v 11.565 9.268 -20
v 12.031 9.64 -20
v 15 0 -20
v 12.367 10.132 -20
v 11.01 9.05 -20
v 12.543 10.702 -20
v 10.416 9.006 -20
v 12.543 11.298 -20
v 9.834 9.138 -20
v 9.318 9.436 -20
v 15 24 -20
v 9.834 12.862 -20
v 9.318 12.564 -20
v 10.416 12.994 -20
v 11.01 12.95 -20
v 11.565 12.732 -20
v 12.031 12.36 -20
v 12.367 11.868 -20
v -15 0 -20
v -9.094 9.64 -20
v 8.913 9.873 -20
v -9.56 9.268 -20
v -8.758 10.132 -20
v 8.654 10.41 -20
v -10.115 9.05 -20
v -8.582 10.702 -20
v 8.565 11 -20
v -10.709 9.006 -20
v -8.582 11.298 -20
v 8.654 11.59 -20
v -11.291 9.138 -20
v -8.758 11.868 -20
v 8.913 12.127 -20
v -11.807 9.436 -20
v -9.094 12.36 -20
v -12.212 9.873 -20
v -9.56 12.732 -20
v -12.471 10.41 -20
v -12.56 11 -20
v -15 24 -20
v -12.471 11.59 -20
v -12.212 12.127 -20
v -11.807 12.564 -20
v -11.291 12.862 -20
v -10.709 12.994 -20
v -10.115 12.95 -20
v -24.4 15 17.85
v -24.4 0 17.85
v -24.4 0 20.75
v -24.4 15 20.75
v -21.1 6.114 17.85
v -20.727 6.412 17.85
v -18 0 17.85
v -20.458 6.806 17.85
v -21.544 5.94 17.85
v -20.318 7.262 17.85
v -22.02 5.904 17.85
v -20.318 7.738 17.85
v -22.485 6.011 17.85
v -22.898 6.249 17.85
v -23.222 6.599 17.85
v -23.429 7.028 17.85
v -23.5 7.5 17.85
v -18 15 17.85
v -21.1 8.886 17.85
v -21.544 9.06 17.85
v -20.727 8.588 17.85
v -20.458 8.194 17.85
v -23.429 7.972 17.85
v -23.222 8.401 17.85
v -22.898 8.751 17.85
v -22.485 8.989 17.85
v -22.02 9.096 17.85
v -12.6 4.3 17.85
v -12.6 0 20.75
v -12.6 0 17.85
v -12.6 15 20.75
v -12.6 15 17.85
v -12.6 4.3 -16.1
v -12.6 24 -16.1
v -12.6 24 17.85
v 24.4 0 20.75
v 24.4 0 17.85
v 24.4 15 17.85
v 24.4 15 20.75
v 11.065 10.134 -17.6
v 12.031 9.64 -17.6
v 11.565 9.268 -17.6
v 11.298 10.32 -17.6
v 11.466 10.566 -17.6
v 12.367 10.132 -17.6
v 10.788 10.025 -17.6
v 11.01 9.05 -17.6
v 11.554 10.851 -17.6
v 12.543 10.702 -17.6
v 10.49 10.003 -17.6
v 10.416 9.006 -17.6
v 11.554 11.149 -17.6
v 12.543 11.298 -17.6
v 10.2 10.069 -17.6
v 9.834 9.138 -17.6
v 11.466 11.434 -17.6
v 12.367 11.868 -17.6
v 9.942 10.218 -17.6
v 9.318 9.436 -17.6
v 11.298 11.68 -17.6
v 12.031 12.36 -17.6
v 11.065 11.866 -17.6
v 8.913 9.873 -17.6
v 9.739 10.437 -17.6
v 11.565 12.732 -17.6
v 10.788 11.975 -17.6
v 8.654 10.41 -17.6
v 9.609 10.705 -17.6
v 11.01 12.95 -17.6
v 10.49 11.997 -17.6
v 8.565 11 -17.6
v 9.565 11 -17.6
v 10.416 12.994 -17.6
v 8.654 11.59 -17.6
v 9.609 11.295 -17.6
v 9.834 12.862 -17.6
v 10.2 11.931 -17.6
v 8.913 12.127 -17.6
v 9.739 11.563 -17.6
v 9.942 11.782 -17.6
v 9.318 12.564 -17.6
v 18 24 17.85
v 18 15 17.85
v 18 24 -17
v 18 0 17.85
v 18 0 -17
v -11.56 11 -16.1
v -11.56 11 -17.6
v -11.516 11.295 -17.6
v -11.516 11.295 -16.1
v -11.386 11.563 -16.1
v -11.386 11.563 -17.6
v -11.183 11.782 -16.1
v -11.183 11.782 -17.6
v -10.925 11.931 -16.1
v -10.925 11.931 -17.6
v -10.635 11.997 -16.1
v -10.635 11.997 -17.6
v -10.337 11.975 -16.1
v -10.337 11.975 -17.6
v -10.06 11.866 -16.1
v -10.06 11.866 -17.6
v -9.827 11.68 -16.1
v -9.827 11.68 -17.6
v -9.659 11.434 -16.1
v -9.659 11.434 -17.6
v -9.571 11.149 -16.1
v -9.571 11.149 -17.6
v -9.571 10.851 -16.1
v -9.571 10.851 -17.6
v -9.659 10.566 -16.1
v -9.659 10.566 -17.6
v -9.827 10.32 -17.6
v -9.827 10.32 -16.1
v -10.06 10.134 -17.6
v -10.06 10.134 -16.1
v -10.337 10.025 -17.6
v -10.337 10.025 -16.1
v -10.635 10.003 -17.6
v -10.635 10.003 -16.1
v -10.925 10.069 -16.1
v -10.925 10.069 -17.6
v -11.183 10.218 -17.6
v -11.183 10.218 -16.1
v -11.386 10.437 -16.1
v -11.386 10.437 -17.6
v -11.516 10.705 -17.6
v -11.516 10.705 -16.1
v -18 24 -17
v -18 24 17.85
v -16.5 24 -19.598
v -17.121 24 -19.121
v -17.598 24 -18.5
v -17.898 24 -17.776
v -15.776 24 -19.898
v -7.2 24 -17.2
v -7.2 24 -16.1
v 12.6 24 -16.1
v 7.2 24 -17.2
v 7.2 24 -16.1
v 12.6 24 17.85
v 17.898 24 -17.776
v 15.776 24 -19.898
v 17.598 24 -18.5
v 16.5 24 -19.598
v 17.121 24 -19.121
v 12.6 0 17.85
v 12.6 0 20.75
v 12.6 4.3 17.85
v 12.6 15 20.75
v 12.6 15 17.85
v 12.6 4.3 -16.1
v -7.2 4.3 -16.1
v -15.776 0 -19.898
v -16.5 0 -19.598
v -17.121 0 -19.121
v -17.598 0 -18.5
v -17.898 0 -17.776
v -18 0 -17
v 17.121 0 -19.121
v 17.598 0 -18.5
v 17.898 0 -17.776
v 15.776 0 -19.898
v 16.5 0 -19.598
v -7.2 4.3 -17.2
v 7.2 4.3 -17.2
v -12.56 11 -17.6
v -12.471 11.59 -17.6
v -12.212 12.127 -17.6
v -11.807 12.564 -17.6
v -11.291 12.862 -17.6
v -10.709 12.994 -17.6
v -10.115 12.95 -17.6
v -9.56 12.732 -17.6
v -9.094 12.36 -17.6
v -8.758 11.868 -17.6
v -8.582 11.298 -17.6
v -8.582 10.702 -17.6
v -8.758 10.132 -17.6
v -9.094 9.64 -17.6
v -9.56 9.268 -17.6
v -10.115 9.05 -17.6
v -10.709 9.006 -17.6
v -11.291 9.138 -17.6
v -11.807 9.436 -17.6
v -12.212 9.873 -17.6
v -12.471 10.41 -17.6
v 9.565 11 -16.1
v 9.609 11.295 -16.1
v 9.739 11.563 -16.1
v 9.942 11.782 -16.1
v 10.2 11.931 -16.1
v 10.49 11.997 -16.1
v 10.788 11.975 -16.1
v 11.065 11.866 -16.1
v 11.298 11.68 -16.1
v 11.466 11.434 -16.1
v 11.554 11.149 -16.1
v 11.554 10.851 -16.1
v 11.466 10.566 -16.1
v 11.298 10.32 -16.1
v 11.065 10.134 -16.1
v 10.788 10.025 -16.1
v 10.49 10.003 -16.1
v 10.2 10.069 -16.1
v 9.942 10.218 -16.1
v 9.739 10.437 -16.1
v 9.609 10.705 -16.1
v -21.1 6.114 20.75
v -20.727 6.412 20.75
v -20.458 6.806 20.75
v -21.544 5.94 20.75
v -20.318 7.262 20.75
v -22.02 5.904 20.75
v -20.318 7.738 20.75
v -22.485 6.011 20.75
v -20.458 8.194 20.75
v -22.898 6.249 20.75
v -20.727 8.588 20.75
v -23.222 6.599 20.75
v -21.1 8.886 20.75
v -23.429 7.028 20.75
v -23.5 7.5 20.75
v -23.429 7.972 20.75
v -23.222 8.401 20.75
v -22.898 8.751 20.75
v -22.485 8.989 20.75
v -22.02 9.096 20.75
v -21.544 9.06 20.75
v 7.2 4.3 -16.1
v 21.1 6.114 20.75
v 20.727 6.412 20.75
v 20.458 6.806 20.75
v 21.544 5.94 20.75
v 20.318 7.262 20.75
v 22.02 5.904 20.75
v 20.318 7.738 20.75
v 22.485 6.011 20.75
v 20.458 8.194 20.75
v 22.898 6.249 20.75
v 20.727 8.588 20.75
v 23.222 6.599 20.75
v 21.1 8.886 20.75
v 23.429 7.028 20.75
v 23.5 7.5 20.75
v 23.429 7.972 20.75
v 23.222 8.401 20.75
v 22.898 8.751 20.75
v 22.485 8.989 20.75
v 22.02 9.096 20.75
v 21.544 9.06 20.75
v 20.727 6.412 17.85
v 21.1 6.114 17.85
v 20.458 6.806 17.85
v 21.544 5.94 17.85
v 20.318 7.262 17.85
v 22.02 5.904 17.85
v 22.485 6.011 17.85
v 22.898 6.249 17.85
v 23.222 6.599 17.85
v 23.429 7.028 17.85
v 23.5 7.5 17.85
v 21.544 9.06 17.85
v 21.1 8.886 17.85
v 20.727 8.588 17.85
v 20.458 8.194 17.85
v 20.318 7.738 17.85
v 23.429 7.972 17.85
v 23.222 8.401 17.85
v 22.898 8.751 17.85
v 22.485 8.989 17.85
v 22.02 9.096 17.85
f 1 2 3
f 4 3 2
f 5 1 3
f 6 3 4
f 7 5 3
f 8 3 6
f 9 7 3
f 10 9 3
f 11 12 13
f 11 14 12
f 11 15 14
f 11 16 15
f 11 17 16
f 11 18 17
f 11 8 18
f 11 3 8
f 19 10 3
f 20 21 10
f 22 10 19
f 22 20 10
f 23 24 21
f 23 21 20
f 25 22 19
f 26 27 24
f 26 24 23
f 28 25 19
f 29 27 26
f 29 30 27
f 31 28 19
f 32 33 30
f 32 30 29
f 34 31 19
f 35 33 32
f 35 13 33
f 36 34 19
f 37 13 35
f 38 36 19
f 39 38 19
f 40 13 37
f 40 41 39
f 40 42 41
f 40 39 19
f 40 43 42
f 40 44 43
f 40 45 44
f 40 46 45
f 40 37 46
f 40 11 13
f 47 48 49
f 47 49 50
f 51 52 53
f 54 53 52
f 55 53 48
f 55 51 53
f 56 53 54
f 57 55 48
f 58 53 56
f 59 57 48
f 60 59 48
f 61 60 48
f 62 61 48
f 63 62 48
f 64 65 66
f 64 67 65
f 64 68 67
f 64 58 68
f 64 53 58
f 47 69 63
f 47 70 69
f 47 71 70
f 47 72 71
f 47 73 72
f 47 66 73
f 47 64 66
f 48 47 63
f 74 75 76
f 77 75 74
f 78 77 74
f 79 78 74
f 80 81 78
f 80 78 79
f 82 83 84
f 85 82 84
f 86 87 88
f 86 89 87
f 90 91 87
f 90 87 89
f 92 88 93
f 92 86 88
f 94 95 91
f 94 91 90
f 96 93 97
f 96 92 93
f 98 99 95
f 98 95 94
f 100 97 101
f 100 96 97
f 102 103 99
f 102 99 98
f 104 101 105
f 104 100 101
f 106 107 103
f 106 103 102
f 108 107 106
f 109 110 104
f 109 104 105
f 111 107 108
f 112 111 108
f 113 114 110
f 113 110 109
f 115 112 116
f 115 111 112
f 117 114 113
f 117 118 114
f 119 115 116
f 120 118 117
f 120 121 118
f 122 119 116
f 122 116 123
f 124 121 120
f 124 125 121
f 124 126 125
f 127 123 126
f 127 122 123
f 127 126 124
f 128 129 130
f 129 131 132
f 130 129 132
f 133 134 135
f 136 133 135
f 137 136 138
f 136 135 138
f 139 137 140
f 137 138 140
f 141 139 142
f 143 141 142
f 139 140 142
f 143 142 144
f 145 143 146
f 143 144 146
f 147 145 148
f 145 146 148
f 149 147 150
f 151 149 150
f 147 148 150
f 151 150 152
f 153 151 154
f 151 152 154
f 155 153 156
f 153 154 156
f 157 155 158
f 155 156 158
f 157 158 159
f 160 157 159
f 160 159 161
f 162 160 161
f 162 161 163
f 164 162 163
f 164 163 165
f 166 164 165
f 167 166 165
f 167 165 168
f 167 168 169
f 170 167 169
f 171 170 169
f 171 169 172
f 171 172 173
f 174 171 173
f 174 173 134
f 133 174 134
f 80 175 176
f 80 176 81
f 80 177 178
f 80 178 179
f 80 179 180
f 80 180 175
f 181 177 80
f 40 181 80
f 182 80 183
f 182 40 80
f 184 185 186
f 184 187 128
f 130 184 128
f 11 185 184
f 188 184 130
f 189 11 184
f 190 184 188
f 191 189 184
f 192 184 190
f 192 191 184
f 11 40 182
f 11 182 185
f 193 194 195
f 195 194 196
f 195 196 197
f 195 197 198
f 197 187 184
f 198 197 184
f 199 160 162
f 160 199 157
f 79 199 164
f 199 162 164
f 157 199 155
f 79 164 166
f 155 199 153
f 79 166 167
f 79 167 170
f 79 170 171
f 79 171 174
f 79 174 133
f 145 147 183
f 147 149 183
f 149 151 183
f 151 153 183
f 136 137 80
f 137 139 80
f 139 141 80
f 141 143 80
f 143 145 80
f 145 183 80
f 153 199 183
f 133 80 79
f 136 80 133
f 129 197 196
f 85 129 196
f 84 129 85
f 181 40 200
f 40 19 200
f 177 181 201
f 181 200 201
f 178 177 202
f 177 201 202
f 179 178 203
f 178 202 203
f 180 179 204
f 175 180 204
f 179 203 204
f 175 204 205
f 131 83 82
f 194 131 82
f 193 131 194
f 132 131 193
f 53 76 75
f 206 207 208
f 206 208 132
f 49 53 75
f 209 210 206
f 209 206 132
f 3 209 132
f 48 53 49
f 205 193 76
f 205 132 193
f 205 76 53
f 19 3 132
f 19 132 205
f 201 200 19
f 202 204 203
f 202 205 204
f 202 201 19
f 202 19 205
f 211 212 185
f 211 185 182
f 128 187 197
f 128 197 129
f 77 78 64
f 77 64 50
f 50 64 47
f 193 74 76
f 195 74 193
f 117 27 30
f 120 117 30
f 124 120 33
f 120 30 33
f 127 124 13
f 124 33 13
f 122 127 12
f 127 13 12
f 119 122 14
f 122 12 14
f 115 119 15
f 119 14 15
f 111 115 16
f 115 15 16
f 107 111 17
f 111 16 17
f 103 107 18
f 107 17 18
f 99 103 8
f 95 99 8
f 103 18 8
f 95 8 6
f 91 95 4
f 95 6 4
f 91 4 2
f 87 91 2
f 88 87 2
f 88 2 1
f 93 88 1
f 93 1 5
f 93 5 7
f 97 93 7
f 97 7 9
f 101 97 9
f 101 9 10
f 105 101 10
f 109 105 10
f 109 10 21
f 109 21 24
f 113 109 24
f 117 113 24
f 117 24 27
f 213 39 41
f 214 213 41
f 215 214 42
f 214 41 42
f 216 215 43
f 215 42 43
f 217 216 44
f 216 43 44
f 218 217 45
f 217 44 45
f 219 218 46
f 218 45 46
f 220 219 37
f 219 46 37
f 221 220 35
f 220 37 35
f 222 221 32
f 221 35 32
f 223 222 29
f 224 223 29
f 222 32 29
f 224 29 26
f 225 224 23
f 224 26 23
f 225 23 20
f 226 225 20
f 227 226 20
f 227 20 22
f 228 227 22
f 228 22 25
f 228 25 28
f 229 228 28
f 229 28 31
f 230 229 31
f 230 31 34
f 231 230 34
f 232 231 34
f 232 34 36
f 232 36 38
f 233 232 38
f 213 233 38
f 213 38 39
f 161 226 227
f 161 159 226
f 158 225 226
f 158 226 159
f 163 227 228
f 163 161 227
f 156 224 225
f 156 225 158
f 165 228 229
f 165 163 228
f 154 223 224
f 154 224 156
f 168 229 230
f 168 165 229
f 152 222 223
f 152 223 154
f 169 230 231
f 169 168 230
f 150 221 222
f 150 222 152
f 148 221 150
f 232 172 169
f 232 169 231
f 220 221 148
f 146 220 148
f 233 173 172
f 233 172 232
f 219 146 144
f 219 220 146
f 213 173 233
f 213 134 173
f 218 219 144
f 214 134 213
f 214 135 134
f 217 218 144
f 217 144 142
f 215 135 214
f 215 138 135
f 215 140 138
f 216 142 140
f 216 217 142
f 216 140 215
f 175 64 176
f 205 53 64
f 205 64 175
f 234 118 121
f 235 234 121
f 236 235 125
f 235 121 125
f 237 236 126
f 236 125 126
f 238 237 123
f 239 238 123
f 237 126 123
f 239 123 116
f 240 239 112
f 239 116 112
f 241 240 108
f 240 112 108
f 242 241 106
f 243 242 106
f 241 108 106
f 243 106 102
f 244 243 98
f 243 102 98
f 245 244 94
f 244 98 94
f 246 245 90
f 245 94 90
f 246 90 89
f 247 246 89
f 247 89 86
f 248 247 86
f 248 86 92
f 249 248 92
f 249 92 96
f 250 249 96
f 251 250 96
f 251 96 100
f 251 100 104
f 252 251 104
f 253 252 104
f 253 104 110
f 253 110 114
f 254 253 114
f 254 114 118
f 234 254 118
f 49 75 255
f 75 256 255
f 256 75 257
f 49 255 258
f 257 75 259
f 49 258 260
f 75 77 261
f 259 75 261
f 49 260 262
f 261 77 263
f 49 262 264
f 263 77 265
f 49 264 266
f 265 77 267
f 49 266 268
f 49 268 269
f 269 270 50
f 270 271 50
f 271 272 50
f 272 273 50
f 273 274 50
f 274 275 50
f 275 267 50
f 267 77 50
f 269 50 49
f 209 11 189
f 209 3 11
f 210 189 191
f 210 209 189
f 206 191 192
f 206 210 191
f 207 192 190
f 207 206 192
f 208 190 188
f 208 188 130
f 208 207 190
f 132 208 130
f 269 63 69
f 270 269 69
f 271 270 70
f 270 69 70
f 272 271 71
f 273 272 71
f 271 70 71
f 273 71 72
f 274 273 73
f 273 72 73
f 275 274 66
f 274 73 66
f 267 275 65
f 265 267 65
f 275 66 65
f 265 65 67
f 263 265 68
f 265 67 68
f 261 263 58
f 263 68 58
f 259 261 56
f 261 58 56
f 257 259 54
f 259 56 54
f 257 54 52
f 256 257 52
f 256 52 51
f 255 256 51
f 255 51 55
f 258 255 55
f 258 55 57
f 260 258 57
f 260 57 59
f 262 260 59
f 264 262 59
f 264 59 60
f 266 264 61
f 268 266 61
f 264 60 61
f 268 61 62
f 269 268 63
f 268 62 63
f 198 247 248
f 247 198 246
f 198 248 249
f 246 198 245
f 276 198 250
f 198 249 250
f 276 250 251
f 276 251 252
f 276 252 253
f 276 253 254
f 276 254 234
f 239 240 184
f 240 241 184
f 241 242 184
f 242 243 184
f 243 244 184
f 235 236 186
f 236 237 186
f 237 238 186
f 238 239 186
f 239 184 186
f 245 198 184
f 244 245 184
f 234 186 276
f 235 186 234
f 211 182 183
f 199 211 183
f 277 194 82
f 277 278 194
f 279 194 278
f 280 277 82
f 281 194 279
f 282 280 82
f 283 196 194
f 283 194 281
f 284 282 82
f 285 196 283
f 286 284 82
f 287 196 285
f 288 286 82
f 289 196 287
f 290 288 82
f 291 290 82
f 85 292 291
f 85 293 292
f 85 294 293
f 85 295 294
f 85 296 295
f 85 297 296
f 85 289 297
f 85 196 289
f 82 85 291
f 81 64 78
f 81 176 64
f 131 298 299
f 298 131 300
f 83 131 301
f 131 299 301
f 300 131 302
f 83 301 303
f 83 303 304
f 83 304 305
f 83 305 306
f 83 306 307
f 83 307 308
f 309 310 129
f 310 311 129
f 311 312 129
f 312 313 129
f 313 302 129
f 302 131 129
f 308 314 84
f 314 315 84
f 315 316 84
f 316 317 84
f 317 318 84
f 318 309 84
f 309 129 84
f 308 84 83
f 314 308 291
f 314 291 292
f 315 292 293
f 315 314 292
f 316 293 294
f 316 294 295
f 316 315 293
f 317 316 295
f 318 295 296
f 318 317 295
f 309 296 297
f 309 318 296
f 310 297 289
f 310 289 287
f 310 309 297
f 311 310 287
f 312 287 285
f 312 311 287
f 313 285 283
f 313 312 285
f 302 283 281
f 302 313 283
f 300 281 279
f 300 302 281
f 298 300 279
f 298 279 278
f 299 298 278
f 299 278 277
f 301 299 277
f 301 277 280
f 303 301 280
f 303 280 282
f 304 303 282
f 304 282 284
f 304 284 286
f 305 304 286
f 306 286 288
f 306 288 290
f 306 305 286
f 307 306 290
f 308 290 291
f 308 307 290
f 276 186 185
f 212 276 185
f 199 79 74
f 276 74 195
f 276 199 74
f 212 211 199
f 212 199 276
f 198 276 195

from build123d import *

# Parameters (mm, degrees)
SKETCH_3_W           = 36
SKETCH_3_H           = 50
EXTRUDE_1_DEPTH      = 24
SKETCH_4_W           = 24.8
SKETCH_4_H           = 31.8
CUT_EXTRUDE_1_DEPTH  = 19.7
SKETCH_5_W           = 14
SKETCH_5_H           = 2.2
CUT_EXTRUDE_3_DEPTH  = 19.7
SKETCH_6_W           = 18.5
SKETCH_6_H           = 3.8
CUT_EXTRUDE_4_DEPTH  = 14.7
SKETCH_7_W           = 24.8
SKETCH_7_H           = 24.280407208
CUT_EXTRUDE_5_DEPTH  = 2
SKETCH_8_R           = 2
CUT_EXTRUDE_6_DEPTH  = 6.4
SKETCH_9_R           = 1
CUT_EXTRUDE_7_DEPTH  = 6.4
SKETCH_10_R          = 2
CUT_EXTRUDE_8_DEPTH  = 7.4
SKETCH_11_R          = 1
CUT_EXTRUDE_9_DEPTH  = 7.4
SKETCH_14_W          = 47.693248889
SKETCH_14_H          = 41.94352182
CUT_EXTRUDE_12_DEPTH = 4
SKETCH_16_W          = 69.166934332
SKETCH_16_H          = 39.422219991
CUT_EXTRUDE_13_DEPTH = 5
CUT_EXTRUDE_17_DEPTH = 19.7
SKETCH_19_W          = 18.6
SKETCH_19_H          = 1.8
CUT_EXTRUDE_18_DEPTH = 12.7
SKETCH_20_W          = 66.697030433
SKETCH_20_H          = 63.084499434
CUT_EXTRUDE_19_DEPTH = 3.15
SKETCH_21_W          = 24.8
SKETCH_21_H          = 17.7
CUT_EXTRUDE_20_DEPTH = 10
SKETCH_22_W          = 12
SKETCH_22_H          = 15
SKETCH_22_R          = 1.6
EXTRUDE_2_DEPTH      = 2.9
SKETCH_23_W          = 25.2
SKETCH_23_H          = 39.225239964
CUT_EXTRUDE_22_DEPTH = 19.7
SKETCH_24_W          = 25.2
SKETCH_24_H          = 2.9
CUT_EXTRUDE_23_DEPTH = 4.3
FILLET_1_R           = 3


with BuildPart() as part:
    # 草图3 → 凸台-拉伸1 (new body)
    with BuildSketch(Plane(origin=(0, 0, 0), x_dir=(1, 0, 0), z_dir=(0, 1, 0))):
        Rectangle(SKETCH_3_W, SKETCH_3_H)
    extrude(amount=EXTRUDE_1_DEPTH)

    # 草图4 → 切除-拉伸1 (cut)
    with BuildSketch(Plane(origin=(0, 24, 0), x_dir=(1, 0, 0), z_dir=(0, 1, 0))):
        Rectangle(SKETCH_4_W, SKETCH_4_H)
    extrude(amount=-CUT_EXTRUDE_1_DEPTH, mode=Mode.SUBTRACT)

    # 草图5 → 切除-拉伸3 (cut)
    with BuildSketch(Plane(origin=(0, 24, 0), x_dir=(1, 0, 0), z_dir=(0, 1, 0))):
        with Locations((0, 15.9)):
            Rectangle(SKETCH_5_W, SKETCH_5_H)
    extrude(amount=-CUT_EXTRUDE_3_DEPTH, mode=Mode.SUBTRACT)

    # 草图6 → 切除-拉伸4 (cut)
    with BuildSketch(Plane(origin=(0, 24, 0), x_dir=(1, 0, 0), z_dir=(0, 1, 0))):
        with Locations((0, -15.9)):
            Rectangle(SKETCH_6_W, SKETCH_6_H)
    extrude(amount=-CUT_EXTRUDE_4_DEPTH, mode=Mode.SUBTRACT)

    # 草图7 → 切除-拉伸5 (cut)
    with BuildSketch(Plane(origin=(0, 24, 0), x_dir=(1, 0, 0), z_dir=(0, 1, 0))):
        with Locations((0, -25)):
            Rectangle(SKETCH_7_W, SKETCH_7_H)
    extrude(amount=-CUT_EXTRUDE_5_DEPTH, mode=Mode.SUBTRACT)

    # 草图8 → 切除-拉伸6 (cut)
    with BuildSketch(Plane.XY.offset(25)):
        with Locations((10.65, 7.2)):
            Circle(SKETCH_8_R)
        with Locations((-10.65, 7.2)):
            Circle(SKETCH_8_R)
    extrude(amount=-CUT_EXTRUDE_6_DEPTH, mode=Mode.SUBTRACT)

    # 草图9 → 切除-拉伸7 (cut)
    with BuildSketch(Plane.XY.offset(18.6)):
        with Locations((10.65, 7.2)):
            Circle(SKETCH_9_R)
        with Locations((-10.65, 7.2)):
            Circle(SKETCH_9_R)
    extrude(amount=-CUT_EXTRUDE_7_DEPTH, mode=Mode.SUBTRACT)

    # 草图10 → 切除-拉伸8 (cut)
    with BuildSketch(Plane(origin=(0, 0, -25), x_dir=(-1, 0, 0), z_dir=(0, 0, -1))):
        with Locations((-10.565, 11)):
            Circle(SKETCH_10_R)
        with Locations((10.56, 11)):
            Circle(SKETCH_10_R)
    extrude(amount=-CUT_EXTRUDE_8_DEPTH, mode=Mode.SUBTRACT)

    # 草图11 → 切除-拉伸9 (cut)
    with BuildSketch(Plane(origin=(0, 0, -17.6), x_dir=(-1, 0, 0), z_dir=(0, 0, -1))):
        with Locations((10.56, 11)):
            Circle(SKETCH_11_R)
        with Locations((-10.565, 11)):
            Circle(SKETCH_11_R)
    extrude(amount=-CUT_EXTRUDE_9_DEPTH, mode=Mode.SUBTRACT)

    # 草图14 → 切除-拉伸12 (cut)
    with BuildSketch(Plane.XY.offset(25)):
        with Locations((-2.653720185, 12.393348568)):
            Rectangle(SKETCH_14_W, SKETCH_14_H)
    extrude(amount=-CUT_EXTRUDE_12_DEPTH, mode=Mode.SUBTRACT)

    # 草图16 → 切除-拉伸13 (cut)
    with BuildSketch(Plane(origin=(0, 0, -25), x_dir=(-1, 0, 0), z_dir=(0, 0, -1))):
        with Locations((0.858826259, 12.588310345)):
            Rectangle(SKETCH_16_W, SKETCH_16_H)
    extrude(amount=-CUT_EXTRUDE_13_DEPTH, mode=Mode.SUBTRACT)

    # 草图18 → 切除-拉伸17 (cut)
    with BuildSketch(Plane(origin=(0, 24, 0), x_dir=(1, 0, 0), z_dir=(0, 1, 0))):
        Polygon((-12.6, -16.1), (12.6, -16.1), (12.6, 16.1), (7.2, 16.1), (7.2, 17.2), (-7.2, 17.2), (-7.2, 16.1), (-12.6, 16.1), align=None)
    extrude(amount=-CUT_EXTRUDE_17_DEPTH, mode=Mode.SUBTRACT)

    # 草图19 → 切除-拉伸18 (cut)
    with BuildSketch(Plane(origin=(0, 22, 0), x_dir=(1, 0, 0), z_dir=(0, 1, 0))):
        with Locations((0, -16.95)):
            Rectangle(SKETCH_19_W, SKETCH_19_H)
    extrude(amount=-CUT_EXTRUDE_18_DEPTH, mode=Mode.SUBTRACT)

    # 草图20 → 切除-拉伸19 (cut)
    with BuildSketch(Plane.XY.offset(21)):
        with Locations((4.746063078, 3.342697103)):
            Rectangle(SKETCH_20_W, SKETCH_20_H)
    extrude(amount=-CUT_EXTRUDE_19_DEPTH, mode=Mode.SUBTRACT)

    # 草图21 → 切除-拉伸20 (cut)
    with BuildSketch(Plane.XY.offset(17.85)):
        with Locations((0, 13.15)):
            Rectangle(SKETCH_21_W, SKETCH_21_H)
    extrude(amount=-CUT_EXTRUDE_20_DEPTH, mode=Mode.SUBTRACT)

    # 草图22 → 凸台-拉伸2 (add)
    with BuildSketch(Plane.XY.offset(17.85)):
        with Locations((18.4, 7.5)):
            Rectangle(SKETCH_22_W, SKETCH_22_H)
        with Locations((21.9, 7.5)):
            Circle(SKETCH_22_R, mode=Mode.SUBTRACT)
    extrude_2 = extrude(amount=EXTRUDE_2_DEPTH)

    # 镜向1: 凸台-拉伸2 across plane
    add(extrude_2.mirror(Plane(origin=(0, 0, 0), x_dir=(0, 0, 1), z_dir=(1, 0, 0))))

    # 草图23 → 切除-拉伸22 (cut)
    with BuildSketch(Plane(origin=(0, 24, 0), x_dir=(1, 0, 0), z_dir=(0, 1, 0))):
        with Locations((0, -3.512619982)):
            Rectangle(SKETCH_23_W, SKETCH_23_H)
    extrude(amount=-CUT_EXTRUDE_22_DEPTH, mode=Mode.SUBTRACT)

    # 草图24 → 切除-拉伸23 (cut)
    with BuildSketch(Plane(origin=(0, 4.3, 0), x_dir=(1, 0, 0), z_dir=(0, 1, 0))):
        with Locations((0, -19.3)):
            Rectangle(SKETCH_24_W, SKETCH_24_H)
    extrude(amount=-CUT_EXTRUDE_23_DEPTH, mode=Mode.SUBTRACT)

    # 圆角1
    fillet_1_edges = [part.edges().sort_by_distance(p)[0] for p in [
        (-18, 12, -20),
        (18, 12, -20),
    ]]
    fillet(fillet_1_edges, radius=FILLET_1_R)


solid = part.part
